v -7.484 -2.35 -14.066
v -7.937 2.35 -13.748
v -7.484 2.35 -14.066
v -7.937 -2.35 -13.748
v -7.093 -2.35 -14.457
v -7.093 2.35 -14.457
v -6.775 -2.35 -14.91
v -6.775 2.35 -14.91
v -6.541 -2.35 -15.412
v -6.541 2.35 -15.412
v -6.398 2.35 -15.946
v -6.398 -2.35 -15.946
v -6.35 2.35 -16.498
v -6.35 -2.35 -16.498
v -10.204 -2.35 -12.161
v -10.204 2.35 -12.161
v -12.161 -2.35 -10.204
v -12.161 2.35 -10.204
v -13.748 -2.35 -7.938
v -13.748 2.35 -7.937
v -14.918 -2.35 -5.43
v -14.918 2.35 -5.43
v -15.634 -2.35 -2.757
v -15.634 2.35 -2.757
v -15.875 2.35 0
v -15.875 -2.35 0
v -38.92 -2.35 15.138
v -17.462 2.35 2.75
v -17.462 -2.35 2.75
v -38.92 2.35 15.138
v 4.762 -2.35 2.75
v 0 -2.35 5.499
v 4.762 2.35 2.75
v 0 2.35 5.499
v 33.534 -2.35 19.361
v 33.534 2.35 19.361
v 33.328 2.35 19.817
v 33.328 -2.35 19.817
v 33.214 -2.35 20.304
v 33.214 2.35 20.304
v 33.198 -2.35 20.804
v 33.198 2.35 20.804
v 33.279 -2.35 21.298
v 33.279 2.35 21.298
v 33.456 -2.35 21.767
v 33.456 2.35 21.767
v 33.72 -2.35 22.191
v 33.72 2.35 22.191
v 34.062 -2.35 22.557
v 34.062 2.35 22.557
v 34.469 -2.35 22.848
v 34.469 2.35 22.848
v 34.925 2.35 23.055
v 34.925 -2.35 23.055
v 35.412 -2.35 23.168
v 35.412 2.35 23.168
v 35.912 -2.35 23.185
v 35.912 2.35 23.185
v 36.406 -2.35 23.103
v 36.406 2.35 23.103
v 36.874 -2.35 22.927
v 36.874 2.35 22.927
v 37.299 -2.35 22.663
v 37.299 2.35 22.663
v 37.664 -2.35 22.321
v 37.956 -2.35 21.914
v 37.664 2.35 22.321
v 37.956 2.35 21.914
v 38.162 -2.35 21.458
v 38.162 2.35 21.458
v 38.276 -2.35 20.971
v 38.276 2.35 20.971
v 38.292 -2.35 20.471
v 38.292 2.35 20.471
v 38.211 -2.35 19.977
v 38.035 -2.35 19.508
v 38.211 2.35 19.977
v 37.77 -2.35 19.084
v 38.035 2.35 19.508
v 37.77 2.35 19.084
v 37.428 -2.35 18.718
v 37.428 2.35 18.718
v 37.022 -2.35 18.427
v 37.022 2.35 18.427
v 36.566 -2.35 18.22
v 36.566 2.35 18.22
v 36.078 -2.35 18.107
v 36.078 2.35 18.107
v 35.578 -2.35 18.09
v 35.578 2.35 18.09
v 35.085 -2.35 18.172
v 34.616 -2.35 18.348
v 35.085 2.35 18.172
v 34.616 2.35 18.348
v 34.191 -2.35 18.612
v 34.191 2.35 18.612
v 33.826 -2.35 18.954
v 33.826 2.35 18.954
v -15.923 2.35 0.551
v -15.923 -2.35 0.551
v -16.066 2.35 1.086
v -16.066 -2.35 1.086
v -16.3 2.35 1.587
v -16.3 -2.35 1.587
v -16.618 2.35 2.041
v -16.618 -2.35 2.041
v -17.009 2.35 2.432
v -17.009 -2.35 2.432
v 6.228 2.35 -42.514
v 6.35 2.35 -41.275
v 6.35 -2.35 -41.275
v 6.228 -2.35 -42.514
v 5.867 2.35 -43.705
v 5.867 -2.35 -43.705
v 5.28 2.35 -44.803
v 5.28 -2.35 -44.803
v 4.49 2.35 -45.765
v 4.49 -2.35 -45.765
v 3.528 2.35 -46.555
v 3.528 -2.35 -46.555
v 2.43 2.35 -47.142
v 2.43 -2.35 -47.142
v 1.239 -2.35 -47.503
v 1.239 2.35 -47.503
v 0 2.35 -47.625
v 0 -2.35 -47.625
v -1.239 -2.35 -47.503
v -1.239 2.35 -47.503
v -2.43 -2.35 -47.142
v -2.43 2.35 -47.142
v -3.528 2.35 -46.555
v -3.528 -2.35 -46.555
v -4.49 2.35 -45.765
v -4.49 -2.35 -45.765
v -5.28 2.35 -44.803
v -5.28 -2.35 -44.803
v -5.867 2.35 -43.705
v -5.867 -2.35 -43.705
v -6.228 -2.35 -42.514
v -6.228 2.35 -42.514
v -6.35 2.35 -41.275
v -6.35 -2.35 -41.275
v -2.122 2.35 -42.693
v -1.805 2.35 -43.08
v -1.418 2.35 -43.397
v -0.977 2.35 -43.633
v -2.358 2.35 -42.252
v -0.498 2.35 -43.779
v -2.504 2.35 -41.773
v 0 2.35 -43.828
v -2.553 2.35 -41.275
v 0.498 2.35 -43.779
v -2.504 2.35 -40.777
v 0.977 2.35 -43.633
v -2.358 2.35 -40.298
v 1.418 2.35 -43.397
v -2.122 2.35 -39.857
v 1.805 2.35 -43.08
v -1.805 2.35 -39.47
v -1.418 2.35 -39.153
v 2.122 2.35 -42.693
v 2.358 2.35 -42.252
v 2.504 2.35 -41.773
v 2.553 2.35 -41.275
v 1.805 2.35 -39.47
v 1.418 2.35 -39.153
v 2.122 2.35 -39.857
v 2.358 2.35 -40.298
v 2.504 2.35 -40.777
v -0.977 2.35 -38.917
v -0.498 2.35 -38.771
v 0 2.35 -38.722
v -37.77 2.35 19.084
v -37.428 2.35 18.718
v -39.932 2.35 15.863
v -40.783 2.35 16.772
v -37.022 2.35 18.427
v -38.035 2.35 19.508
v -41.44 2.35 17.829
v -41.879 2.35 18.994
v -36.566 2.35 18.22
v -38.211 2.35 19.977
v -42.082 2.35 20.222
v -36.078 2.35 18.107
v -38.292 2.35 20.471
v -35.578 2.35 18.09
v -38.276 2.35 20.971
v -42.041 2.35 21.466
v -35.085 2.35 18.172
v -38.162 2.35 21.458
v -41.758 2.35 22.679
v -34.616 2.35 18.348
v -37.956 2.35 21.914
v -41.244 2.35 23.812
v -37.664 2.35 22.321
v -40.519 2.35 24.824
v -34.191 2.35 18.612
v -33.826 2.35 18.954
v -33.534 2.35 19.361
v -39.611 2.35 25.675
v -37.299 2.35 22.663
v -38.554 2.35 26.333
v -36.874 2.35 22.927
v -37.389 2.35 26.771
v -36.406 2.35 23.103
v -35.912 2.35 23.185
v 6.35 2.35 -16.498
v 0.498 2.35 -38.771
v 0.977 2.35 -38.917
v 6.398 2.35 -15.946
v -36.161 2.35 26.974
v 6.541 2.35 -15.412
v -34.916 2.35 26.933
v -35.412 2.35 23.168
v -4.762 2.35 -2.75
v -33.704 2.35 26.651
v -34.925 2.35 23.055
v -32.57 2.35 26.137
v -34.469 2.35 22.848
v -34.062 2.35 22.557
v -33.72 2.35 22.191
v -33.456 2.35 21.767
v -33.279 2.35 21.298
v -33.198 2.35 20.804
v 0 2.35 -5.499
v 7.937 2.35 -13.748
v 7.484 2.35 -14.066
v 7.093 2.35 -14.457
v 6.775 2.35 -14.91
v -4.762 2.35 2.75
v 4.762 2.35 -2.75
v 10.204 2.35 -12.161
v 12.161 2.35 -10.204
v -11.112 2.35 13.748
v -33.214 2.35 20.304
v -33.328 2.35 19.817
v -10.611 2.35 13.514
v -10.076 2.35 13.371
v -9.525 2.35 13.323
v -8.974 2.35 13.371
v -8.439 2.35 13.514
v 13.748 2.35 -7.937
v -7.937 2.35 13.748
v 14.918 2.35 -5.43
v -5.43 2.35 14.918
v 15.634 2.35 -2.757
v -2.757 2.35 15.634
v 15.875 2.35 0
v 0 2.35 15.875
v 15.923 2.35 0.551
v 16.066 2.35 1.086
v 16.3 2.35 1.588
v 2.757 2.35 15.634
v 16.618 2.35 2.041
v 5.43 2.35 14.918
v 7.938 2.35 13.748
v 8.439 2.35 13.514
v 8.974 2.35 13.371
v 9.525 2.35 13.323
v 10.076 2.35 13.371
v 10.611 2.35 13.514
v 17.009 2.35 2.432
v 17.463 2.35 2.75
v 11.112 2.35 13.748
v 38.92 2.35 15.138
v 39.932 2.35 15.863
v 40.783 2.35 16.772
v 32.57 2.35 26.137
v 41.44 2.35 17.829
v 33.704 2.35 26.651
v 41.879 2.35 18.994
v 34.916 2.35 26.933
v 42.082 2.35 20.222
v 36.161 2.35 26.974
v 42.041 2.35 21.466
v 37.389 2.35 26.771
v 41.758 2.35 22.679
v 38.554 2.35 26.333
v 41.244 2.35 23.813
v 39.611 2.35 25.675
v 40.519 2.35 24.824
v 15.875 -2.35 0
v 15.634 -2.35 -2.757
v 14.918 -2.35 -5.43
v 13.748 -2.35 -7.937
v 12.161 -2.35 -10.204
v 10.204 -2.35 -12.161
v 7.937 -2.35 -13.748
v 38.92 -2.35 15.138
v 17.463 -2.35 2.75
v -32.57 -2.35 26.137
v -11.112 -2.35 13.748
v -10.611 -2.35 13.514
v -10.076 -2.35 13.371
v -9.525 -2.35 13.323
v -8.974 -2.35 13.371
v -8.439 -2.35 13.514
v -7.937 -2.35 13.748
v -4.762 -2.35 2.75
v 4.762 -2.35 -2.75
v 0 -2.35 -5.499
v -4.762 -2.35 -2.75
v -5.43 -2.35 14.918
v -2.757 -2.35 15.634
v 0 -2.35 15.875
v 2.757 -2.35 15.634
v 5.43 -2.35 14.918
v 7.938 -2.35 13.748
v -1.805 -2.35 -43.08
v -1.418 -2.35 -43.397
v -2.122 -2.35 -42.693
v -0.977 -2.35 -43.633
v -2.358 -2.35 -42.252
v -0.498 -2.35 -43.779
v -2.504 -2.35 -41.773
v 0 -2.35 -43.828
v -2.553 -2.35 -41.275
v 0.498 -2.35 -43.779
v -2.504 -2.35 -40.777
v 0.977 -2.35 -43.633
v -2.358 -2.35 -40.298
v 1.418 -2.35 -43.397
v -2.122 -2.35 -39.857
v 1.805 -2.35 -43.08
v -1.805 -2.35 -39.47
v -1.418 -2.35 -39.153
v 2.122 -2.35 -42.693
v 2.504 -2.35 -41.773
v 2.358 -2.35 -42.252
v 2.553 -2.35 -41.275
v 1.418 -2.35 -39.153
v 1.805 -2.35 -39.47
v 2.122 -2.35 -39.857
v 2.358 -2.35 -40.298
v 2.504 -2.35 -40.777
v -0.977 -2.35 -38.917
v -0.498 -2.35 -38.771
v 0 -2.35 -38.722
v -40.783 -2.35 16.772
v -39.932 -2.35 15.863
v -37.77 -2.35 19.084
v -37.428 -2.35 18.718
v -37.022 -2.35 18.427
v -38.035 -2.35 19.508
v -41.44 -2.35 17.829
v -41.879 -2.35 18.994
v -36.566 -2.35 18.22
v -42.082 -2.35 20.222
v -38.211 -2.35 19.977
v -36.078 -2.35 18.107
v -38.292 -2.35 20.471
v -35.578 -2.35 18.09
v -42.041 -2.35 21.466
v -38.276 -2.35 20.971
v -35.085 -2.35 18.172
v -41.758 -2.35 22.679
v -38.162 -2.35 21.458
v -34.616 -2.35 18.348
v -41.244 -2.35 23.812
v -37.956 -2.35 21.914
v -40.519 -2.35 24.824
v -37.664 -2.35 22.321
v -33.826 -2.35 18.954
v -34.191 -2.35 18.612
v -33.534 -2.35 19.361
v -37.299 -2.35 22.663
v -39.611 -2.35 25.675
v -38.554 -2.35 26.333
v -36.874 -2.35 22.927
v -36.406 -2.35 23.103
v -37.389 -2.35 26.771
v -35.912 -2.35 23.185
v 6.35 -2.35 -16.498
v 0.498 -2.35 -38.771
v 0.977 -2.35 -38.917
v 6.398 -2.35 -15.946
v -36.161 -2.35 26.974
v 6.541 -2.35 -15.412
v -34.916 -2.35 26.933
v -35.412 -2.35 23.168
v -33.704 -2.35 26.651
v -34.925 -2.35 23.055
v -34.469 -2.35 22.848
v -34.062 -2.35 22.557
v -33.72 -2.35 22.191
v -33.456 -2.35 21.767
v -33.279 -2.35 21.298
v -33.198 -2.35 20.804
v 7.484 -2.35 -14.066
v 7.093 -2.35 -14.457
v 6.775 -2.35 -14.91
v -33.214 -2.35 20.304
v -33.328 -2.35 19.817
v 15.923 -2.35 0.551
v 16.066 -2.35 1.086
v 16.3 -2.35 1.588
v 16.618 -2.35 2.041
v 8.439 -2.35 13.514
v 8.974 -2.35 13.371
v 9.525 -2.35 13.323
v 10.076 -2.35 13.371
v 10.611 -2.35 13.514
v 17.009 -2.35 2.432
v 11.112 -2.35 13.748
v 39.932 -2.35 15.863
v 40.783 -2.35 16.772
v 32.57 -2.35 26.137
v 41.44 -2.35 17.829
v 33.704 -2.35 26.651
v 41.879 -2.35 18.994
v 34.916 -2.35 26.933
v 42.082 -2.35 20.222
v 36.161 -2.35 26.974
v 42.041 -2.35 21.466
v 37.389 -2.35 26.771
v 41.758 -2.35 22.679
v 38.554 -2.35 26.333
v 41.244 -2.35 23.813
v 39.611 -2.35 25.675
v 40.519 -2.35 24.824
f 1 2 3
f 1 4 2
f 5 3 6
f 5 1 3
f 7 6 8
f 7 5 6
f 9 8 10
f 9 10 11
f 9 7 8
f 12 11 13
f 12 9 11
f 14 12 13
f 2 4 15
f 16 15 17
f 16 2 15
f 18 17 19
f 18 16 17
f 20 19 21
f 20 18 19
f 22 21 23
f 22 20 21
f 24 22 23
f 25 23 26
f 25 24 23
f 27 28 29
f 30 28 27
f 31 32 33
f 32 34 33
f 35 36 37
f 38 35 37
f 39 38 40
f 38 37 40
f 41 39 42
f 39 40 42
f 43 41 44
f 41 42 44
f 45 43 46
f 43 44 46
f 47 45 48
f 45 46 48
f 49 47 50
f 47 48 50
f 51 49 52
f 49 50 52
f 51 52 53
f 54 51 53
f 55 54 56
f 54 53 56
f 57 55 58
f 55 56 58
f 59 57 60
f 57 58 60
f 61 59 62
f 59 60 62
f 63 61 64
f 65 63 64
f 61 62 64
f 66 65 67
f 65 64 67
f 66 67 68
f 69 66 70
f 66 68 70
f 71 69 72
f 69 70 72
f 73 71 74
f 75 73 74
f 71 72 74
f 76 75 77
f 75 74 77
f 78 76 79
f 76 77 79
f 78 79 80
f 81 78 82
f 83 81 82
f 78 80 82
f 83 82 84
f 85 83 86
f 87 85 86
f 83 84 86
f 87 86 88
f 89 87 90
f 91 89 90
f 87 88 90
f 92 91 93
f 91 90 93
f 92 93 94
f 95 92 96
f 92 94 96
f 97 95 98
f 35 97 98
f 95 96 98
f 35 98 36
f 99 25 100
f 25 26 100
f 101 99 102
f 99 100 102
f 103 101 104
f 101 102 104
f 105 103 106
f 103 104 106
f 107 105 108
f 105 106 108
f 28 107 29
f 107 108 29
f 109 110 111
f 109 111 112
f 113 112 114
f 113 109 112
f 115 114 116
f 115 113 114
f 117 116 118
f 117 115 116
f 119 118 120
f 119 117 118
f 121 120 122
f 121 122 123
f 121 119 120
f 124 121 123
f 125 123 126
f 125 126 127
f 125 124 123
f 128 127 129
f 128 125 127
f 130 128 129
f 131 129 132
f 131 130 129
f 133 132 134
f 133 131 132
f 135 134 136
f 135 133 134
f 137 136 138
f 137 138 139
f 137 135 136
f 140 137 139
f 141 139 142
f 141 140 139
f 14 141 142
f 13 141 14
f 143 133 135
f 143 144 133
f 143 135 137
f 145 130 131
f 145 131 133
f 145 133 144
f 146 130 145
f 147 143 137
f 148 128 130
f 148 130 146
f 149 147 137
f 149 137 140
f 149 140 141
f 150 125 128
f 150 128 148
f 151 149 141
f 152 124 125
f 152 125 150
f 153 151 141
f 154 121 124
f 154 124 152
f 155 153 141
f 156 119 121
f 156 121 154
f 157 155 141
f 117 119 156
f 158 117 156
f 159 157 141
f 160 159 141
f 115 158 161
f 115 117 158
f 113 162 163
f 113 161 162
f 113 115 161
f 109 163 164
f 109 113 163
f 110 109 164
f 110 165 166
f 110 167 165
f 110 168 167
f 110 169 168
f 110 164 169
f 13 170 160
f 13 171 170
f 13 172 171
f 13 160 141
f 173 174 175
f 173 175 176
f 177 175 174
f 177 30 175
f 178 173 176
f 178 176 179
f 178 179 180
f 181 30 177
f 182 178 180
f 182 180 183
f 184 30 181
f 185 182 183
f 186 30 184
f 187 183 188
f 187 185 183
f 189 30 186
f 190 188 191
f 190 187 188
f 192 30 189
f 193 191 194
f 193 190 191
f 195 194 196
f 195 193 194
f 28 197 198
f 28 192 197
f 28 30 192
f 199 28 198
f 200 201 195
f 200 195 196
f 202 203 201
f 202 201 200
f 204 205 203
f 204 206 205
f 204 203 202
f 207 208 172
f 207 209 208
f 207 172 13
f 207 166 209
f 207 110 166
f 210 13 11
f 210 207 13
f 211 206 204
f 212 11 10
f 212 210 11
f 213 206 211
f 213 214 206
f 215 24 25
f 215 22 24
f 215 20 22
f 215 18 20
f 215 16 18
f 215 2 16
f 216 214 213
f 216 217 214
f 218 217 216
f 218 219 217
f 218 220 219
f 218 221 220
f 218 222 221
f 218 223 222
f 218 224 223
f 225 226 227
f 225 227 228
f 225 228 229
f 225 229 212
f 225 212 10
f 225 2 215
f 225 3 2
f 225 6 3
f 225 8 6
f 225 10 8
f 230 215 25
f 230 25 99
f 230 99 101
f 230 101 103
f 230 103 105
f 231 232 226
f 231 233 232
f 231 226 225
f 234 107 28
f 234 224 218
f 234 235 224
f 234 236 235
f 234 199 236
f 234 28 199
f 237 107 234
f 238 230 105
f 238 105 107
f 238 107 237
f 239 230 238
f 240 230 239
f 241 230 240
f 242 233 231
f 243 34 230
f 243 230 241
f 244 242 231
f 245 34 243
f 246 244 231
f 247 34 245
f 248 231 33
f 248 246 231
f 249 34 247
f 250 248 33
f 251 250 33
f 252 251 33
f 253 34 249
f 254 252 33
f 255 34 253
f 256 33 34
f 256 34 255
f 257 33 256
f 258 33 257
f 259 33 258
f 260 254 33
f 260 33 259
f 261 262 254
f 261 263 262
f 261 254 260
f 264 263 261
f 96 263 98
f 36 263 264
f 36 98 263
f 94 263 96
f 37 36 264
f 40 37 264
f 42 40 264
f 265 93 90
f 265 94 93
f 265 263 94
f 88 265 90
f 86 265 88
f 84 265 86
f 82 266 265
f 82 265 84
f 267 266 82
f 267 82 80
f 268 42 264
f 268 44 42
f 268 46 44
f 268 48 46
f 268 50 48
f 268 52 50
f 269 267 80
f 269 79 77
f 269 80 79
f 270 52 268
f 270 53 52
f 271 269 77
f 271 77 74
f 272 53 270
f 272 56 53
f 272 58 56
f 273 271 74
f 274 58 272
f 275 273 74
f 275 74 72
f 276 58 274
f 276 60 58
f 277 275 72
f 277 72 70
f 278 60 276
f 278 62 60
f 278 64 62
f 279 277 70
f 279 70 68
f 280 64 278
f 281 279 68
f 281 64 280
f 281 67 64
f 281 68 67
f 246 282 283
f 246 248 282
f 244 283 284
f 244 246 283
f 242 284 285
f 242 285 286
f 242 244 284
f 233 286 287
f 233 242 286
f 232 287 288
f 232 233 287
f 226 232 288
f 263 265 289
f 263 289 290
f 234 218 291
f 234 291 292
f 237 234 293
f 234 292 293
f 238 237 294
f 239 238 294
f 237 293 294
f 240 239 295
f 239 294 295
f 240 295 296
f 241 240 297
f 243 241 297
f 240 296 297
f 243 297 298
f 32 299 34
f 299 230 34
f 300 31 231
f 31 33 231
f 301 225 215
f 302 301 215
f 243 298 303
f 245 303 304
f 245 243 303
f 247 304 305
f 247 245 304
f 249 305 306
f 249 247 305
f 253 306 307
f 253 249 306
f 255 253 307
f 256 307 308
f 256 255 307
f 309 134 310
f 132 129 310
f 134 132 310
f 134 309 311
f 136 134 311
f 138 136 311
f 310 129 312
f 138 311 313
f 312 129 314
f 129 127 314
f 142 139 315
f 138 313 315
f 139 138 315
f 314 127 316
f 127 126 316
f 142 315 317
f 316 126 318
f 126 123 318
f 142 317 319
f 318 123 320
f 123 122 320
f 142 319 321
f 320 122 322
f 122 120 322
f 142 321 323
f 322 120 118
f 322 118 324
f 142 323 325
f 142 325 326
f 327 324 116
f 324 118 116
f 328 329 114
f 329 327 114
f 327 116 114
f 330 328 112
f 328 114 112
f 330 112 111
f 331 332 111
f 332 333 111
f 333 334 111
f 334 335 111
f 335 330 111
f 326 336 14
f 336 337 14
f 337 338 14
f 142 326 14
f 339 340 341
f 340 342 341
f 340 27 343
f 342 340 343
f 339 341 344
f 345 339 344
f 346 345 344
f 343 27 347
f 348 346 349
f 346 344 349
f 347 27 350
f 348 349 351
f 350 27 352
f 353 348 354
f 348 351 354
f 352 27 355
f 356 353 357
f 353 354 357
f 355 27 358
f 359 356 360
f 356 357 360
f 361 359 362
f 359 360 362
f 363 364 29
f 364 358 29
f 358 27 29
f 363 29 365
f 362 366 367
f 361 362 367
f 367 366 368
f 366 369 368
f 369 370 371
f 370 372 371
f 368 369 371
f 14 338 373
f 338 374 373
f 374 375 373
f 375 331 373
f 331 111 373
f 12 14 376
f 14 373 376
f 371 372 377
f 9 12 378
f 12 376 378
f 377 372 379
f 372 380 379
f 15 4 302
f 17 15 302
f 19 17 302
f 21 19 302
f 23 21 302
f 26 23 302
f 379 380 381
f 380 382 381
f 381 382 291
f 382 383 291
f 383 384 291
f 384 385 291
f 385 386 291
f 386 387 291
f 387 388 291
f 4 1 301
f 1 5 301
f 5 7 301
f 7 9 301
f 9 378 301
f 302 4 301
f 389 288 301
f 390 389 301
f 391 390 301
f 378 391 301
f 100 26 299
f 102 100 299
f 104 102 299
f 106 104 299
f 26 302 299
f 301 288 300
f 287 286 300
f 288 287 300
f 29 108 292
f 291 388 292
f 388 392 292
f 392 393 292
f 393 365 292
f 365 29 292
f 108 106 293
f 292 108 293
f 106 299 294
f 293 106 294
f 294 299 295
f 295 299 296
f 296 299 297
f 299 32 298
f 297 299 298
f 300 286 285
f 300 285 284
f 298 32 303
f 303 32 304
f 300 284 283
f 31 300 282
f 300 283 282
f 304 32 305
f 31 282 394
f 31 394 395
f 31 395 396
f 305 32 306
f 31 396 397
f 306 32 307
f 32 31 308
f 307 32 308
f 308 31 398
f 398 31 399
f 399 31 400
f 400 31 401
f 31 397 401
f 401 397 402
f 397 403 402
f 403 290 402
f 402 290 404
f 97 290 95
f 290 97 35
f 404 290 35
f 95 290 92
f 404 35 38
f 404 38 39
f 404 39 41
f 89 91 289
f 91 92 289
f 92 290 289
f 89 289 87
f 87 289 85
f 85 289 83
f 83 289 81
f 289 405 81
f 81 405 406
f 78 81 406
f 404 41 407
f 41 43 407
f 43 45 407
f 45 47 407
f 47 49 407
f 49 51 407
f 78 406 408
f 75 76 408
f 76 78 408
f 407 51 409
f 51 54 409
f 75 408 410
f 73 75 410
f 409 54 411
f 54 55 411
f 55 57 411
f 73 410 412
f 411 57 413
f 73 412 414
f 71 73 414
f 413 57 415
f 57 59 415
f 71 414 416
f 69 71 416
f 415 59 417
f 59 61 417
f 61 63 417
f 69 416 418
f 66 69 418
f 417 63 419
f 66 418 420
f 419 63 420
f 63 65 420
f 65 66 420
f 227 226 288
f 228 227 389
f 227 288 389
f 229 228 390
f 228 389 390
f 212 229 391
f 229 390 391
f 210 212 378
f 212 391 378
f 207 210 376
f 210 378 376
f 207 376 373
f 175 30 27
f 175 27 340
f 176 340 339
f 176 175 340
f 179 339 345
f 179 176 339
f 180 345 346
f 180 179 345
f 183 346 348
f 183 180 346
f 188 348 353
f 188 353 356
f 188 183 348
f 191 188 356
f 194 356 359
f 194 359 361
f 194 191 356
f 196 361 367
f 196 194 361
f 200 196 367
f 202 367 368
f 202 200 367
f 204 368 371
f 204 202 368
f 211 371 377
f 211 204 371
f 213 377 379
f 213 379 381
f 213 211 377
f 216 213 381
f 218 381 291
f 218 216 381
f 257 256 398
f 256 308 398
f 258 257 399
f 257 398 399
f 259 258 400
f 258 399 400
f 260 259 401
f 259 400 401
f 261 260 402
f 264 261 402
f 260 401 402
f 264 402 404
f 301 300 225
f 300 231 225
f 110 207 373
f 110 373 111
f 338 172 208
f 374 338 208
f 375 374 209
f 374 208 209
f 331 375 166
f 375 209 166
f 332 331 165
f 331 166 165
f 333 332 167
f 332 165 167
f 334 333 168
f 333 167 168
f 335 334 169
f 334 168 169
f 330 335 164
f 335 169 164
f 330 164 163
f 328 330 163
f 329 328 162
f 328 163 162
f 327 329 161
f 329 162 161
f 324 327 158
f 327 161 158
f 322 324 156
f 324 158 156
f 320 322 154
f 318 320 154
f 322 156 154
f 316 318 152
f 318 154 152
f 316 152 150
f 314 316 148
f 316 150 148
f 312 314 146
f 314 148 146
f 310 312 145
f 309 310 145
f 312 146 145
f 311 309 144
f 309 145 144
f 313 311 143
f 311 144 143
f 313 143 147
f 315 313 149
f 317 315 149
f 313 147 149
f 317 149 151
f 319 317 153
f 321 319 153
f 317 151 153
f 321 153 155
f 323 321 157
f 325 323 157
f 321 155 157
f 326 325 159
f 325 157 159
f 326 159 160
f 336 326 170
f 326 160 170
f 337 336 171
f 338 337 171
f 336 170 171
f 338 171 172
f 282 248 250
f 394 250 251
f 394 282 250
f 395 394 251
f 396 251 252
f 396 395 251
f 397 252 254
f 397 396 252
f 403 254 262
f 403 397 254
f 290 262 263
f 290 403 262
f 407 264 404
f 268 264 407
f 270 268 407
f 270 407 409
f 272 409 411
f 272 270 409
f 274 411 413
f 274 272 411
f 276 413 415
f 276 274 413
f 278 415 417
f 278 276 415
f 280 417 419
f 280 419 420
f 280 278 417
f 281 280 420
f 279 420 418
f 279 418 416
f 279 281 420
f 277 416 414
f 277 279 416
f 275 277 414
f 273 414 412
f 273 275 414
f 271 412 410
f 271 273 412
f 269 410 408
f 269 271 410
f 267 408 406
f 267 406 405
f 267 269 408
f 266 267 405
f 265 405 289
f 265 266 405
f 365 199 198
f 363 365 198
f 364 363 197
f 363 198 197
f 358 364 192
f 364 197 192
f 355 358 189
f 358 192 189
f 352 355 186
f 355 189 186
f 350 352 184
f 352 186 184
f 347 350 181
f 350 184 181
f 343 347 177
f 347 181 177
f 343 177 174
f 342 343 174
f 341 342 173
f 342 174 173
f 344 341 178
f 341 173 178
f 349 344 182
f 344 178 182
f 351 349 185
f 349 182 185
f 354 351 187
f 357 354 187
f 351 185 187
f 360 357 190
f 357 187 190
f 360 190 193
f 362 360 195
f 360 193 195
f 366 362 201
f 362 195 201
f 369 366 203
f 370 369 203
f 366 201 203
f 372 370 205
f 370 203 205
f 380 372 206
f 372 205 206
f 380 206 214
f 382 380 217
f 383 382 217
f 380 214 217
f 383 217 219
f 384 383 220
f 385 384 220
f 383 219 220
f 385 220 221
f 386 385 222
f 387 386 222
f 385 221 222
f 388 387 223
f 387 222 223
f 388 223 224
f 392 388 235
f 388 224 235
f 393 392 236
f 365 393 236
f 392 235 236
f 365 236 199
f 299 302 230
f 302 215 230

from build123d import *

# Parameters (mm, degrees)
SKETCH1_R                = 15.875
BOSS_EXTRUDE1_DEPTH      = 2.3495
SKETCH2_R                = 2.5527
BOSS_EXTRUDE2_DEPTH      = 4.699
FILLET1_R                = 3.175
CIRPATTERN1_COUNT        = 3
FILLET1_OF_CIRPATTERN1_R = 3.175


with BuildPart() as part:
    # Sketch1 → Boss-Extrude1 (new, symmetric)
    with BuildSketch(Plane(origin=(0, 0, 0), x_dir=(1, 0, 0), z_dir=(0, 1, 0))):
        with Locations(Location((0, 0, 0), (0, 0, 270))):
            Circle(SKETCH1_R)
        Polygon((0, 5.499261314), (-4.7625, 2.749630657), (-4.7625, -2.749630657), (0, -5.499261314), (4.7625, -2.749630657), (4.7625, 2.749630657), align=None, mode=Mode.SUBTRACT)
    extrude(amount=BOSS_EXTRUDE1_DEPTH, both=True)

    # Sketch2 → Boss-Extrude2 (add)
    with BuildSketch(Plane(origin=(0, 2.3495, 0), x_dir=(1, 0, 0), z_dir=(0, 1, 0))):
        with BuildLine():
            Line((-6.35, 41.275), (-6.35, 14.549677831))
            ThreePointArc((-6.35, 14.549677831), (0, 15.875), (6.35, 14.549677831))
            Line((6.35, 14.549677831), (6.35, 41.275))
            ThreePointArc((6.35, 41.275), (0, 47.625), (-6.35, 41.275))
        make_face()
        with Locations(Location((0, 41.275, 0), (0, 0, 270))):
            Circle(SKETCH2_R, mode=Mode.SUBTRACT)
    boss_extrude2 = extrude(amount=-BOSS_EXTRUDE2_DEPTH)

    # Fillet1
    fillet1_edges = [part.edges().sort_by_distance(p)[0] for p in [
        (-6.35, 0, -14.549677831),
        (6.35, 0, -14.549677831),
    ]]
    fillet(fillet1_edges, radius=FILLET1_R)

    # CirPattern1: Boss-Extrude2 ×3 about axis
    cirpattern1_axis = Axis((0, 0, 0), (0, 1, 0))
    for i in range(1, CIRPATTERN1_COUNT):
        add(boss_extrude2.rotate(cirpattern1_axis, i * 360 / CIRPATTERN1_COUNT))

    # Fillet1 of CirPattern1
    fillet1_of_cirpattern1_edges = [part.edges().sort_by_distance(p)[0] for p in [
        (-9.425390619, 0, 12.77410023),
        (-15.775390619, 0, 1.775577602),
        (15.775390619, 0, 1.775577602),
        (9.425390619, 0, 12.77410023),
    ]]
    fillet(fillet1_of_cirpattern1_edges, radius=FILLET1_OF_CIRPATTERN1_R)


solid = part.part
